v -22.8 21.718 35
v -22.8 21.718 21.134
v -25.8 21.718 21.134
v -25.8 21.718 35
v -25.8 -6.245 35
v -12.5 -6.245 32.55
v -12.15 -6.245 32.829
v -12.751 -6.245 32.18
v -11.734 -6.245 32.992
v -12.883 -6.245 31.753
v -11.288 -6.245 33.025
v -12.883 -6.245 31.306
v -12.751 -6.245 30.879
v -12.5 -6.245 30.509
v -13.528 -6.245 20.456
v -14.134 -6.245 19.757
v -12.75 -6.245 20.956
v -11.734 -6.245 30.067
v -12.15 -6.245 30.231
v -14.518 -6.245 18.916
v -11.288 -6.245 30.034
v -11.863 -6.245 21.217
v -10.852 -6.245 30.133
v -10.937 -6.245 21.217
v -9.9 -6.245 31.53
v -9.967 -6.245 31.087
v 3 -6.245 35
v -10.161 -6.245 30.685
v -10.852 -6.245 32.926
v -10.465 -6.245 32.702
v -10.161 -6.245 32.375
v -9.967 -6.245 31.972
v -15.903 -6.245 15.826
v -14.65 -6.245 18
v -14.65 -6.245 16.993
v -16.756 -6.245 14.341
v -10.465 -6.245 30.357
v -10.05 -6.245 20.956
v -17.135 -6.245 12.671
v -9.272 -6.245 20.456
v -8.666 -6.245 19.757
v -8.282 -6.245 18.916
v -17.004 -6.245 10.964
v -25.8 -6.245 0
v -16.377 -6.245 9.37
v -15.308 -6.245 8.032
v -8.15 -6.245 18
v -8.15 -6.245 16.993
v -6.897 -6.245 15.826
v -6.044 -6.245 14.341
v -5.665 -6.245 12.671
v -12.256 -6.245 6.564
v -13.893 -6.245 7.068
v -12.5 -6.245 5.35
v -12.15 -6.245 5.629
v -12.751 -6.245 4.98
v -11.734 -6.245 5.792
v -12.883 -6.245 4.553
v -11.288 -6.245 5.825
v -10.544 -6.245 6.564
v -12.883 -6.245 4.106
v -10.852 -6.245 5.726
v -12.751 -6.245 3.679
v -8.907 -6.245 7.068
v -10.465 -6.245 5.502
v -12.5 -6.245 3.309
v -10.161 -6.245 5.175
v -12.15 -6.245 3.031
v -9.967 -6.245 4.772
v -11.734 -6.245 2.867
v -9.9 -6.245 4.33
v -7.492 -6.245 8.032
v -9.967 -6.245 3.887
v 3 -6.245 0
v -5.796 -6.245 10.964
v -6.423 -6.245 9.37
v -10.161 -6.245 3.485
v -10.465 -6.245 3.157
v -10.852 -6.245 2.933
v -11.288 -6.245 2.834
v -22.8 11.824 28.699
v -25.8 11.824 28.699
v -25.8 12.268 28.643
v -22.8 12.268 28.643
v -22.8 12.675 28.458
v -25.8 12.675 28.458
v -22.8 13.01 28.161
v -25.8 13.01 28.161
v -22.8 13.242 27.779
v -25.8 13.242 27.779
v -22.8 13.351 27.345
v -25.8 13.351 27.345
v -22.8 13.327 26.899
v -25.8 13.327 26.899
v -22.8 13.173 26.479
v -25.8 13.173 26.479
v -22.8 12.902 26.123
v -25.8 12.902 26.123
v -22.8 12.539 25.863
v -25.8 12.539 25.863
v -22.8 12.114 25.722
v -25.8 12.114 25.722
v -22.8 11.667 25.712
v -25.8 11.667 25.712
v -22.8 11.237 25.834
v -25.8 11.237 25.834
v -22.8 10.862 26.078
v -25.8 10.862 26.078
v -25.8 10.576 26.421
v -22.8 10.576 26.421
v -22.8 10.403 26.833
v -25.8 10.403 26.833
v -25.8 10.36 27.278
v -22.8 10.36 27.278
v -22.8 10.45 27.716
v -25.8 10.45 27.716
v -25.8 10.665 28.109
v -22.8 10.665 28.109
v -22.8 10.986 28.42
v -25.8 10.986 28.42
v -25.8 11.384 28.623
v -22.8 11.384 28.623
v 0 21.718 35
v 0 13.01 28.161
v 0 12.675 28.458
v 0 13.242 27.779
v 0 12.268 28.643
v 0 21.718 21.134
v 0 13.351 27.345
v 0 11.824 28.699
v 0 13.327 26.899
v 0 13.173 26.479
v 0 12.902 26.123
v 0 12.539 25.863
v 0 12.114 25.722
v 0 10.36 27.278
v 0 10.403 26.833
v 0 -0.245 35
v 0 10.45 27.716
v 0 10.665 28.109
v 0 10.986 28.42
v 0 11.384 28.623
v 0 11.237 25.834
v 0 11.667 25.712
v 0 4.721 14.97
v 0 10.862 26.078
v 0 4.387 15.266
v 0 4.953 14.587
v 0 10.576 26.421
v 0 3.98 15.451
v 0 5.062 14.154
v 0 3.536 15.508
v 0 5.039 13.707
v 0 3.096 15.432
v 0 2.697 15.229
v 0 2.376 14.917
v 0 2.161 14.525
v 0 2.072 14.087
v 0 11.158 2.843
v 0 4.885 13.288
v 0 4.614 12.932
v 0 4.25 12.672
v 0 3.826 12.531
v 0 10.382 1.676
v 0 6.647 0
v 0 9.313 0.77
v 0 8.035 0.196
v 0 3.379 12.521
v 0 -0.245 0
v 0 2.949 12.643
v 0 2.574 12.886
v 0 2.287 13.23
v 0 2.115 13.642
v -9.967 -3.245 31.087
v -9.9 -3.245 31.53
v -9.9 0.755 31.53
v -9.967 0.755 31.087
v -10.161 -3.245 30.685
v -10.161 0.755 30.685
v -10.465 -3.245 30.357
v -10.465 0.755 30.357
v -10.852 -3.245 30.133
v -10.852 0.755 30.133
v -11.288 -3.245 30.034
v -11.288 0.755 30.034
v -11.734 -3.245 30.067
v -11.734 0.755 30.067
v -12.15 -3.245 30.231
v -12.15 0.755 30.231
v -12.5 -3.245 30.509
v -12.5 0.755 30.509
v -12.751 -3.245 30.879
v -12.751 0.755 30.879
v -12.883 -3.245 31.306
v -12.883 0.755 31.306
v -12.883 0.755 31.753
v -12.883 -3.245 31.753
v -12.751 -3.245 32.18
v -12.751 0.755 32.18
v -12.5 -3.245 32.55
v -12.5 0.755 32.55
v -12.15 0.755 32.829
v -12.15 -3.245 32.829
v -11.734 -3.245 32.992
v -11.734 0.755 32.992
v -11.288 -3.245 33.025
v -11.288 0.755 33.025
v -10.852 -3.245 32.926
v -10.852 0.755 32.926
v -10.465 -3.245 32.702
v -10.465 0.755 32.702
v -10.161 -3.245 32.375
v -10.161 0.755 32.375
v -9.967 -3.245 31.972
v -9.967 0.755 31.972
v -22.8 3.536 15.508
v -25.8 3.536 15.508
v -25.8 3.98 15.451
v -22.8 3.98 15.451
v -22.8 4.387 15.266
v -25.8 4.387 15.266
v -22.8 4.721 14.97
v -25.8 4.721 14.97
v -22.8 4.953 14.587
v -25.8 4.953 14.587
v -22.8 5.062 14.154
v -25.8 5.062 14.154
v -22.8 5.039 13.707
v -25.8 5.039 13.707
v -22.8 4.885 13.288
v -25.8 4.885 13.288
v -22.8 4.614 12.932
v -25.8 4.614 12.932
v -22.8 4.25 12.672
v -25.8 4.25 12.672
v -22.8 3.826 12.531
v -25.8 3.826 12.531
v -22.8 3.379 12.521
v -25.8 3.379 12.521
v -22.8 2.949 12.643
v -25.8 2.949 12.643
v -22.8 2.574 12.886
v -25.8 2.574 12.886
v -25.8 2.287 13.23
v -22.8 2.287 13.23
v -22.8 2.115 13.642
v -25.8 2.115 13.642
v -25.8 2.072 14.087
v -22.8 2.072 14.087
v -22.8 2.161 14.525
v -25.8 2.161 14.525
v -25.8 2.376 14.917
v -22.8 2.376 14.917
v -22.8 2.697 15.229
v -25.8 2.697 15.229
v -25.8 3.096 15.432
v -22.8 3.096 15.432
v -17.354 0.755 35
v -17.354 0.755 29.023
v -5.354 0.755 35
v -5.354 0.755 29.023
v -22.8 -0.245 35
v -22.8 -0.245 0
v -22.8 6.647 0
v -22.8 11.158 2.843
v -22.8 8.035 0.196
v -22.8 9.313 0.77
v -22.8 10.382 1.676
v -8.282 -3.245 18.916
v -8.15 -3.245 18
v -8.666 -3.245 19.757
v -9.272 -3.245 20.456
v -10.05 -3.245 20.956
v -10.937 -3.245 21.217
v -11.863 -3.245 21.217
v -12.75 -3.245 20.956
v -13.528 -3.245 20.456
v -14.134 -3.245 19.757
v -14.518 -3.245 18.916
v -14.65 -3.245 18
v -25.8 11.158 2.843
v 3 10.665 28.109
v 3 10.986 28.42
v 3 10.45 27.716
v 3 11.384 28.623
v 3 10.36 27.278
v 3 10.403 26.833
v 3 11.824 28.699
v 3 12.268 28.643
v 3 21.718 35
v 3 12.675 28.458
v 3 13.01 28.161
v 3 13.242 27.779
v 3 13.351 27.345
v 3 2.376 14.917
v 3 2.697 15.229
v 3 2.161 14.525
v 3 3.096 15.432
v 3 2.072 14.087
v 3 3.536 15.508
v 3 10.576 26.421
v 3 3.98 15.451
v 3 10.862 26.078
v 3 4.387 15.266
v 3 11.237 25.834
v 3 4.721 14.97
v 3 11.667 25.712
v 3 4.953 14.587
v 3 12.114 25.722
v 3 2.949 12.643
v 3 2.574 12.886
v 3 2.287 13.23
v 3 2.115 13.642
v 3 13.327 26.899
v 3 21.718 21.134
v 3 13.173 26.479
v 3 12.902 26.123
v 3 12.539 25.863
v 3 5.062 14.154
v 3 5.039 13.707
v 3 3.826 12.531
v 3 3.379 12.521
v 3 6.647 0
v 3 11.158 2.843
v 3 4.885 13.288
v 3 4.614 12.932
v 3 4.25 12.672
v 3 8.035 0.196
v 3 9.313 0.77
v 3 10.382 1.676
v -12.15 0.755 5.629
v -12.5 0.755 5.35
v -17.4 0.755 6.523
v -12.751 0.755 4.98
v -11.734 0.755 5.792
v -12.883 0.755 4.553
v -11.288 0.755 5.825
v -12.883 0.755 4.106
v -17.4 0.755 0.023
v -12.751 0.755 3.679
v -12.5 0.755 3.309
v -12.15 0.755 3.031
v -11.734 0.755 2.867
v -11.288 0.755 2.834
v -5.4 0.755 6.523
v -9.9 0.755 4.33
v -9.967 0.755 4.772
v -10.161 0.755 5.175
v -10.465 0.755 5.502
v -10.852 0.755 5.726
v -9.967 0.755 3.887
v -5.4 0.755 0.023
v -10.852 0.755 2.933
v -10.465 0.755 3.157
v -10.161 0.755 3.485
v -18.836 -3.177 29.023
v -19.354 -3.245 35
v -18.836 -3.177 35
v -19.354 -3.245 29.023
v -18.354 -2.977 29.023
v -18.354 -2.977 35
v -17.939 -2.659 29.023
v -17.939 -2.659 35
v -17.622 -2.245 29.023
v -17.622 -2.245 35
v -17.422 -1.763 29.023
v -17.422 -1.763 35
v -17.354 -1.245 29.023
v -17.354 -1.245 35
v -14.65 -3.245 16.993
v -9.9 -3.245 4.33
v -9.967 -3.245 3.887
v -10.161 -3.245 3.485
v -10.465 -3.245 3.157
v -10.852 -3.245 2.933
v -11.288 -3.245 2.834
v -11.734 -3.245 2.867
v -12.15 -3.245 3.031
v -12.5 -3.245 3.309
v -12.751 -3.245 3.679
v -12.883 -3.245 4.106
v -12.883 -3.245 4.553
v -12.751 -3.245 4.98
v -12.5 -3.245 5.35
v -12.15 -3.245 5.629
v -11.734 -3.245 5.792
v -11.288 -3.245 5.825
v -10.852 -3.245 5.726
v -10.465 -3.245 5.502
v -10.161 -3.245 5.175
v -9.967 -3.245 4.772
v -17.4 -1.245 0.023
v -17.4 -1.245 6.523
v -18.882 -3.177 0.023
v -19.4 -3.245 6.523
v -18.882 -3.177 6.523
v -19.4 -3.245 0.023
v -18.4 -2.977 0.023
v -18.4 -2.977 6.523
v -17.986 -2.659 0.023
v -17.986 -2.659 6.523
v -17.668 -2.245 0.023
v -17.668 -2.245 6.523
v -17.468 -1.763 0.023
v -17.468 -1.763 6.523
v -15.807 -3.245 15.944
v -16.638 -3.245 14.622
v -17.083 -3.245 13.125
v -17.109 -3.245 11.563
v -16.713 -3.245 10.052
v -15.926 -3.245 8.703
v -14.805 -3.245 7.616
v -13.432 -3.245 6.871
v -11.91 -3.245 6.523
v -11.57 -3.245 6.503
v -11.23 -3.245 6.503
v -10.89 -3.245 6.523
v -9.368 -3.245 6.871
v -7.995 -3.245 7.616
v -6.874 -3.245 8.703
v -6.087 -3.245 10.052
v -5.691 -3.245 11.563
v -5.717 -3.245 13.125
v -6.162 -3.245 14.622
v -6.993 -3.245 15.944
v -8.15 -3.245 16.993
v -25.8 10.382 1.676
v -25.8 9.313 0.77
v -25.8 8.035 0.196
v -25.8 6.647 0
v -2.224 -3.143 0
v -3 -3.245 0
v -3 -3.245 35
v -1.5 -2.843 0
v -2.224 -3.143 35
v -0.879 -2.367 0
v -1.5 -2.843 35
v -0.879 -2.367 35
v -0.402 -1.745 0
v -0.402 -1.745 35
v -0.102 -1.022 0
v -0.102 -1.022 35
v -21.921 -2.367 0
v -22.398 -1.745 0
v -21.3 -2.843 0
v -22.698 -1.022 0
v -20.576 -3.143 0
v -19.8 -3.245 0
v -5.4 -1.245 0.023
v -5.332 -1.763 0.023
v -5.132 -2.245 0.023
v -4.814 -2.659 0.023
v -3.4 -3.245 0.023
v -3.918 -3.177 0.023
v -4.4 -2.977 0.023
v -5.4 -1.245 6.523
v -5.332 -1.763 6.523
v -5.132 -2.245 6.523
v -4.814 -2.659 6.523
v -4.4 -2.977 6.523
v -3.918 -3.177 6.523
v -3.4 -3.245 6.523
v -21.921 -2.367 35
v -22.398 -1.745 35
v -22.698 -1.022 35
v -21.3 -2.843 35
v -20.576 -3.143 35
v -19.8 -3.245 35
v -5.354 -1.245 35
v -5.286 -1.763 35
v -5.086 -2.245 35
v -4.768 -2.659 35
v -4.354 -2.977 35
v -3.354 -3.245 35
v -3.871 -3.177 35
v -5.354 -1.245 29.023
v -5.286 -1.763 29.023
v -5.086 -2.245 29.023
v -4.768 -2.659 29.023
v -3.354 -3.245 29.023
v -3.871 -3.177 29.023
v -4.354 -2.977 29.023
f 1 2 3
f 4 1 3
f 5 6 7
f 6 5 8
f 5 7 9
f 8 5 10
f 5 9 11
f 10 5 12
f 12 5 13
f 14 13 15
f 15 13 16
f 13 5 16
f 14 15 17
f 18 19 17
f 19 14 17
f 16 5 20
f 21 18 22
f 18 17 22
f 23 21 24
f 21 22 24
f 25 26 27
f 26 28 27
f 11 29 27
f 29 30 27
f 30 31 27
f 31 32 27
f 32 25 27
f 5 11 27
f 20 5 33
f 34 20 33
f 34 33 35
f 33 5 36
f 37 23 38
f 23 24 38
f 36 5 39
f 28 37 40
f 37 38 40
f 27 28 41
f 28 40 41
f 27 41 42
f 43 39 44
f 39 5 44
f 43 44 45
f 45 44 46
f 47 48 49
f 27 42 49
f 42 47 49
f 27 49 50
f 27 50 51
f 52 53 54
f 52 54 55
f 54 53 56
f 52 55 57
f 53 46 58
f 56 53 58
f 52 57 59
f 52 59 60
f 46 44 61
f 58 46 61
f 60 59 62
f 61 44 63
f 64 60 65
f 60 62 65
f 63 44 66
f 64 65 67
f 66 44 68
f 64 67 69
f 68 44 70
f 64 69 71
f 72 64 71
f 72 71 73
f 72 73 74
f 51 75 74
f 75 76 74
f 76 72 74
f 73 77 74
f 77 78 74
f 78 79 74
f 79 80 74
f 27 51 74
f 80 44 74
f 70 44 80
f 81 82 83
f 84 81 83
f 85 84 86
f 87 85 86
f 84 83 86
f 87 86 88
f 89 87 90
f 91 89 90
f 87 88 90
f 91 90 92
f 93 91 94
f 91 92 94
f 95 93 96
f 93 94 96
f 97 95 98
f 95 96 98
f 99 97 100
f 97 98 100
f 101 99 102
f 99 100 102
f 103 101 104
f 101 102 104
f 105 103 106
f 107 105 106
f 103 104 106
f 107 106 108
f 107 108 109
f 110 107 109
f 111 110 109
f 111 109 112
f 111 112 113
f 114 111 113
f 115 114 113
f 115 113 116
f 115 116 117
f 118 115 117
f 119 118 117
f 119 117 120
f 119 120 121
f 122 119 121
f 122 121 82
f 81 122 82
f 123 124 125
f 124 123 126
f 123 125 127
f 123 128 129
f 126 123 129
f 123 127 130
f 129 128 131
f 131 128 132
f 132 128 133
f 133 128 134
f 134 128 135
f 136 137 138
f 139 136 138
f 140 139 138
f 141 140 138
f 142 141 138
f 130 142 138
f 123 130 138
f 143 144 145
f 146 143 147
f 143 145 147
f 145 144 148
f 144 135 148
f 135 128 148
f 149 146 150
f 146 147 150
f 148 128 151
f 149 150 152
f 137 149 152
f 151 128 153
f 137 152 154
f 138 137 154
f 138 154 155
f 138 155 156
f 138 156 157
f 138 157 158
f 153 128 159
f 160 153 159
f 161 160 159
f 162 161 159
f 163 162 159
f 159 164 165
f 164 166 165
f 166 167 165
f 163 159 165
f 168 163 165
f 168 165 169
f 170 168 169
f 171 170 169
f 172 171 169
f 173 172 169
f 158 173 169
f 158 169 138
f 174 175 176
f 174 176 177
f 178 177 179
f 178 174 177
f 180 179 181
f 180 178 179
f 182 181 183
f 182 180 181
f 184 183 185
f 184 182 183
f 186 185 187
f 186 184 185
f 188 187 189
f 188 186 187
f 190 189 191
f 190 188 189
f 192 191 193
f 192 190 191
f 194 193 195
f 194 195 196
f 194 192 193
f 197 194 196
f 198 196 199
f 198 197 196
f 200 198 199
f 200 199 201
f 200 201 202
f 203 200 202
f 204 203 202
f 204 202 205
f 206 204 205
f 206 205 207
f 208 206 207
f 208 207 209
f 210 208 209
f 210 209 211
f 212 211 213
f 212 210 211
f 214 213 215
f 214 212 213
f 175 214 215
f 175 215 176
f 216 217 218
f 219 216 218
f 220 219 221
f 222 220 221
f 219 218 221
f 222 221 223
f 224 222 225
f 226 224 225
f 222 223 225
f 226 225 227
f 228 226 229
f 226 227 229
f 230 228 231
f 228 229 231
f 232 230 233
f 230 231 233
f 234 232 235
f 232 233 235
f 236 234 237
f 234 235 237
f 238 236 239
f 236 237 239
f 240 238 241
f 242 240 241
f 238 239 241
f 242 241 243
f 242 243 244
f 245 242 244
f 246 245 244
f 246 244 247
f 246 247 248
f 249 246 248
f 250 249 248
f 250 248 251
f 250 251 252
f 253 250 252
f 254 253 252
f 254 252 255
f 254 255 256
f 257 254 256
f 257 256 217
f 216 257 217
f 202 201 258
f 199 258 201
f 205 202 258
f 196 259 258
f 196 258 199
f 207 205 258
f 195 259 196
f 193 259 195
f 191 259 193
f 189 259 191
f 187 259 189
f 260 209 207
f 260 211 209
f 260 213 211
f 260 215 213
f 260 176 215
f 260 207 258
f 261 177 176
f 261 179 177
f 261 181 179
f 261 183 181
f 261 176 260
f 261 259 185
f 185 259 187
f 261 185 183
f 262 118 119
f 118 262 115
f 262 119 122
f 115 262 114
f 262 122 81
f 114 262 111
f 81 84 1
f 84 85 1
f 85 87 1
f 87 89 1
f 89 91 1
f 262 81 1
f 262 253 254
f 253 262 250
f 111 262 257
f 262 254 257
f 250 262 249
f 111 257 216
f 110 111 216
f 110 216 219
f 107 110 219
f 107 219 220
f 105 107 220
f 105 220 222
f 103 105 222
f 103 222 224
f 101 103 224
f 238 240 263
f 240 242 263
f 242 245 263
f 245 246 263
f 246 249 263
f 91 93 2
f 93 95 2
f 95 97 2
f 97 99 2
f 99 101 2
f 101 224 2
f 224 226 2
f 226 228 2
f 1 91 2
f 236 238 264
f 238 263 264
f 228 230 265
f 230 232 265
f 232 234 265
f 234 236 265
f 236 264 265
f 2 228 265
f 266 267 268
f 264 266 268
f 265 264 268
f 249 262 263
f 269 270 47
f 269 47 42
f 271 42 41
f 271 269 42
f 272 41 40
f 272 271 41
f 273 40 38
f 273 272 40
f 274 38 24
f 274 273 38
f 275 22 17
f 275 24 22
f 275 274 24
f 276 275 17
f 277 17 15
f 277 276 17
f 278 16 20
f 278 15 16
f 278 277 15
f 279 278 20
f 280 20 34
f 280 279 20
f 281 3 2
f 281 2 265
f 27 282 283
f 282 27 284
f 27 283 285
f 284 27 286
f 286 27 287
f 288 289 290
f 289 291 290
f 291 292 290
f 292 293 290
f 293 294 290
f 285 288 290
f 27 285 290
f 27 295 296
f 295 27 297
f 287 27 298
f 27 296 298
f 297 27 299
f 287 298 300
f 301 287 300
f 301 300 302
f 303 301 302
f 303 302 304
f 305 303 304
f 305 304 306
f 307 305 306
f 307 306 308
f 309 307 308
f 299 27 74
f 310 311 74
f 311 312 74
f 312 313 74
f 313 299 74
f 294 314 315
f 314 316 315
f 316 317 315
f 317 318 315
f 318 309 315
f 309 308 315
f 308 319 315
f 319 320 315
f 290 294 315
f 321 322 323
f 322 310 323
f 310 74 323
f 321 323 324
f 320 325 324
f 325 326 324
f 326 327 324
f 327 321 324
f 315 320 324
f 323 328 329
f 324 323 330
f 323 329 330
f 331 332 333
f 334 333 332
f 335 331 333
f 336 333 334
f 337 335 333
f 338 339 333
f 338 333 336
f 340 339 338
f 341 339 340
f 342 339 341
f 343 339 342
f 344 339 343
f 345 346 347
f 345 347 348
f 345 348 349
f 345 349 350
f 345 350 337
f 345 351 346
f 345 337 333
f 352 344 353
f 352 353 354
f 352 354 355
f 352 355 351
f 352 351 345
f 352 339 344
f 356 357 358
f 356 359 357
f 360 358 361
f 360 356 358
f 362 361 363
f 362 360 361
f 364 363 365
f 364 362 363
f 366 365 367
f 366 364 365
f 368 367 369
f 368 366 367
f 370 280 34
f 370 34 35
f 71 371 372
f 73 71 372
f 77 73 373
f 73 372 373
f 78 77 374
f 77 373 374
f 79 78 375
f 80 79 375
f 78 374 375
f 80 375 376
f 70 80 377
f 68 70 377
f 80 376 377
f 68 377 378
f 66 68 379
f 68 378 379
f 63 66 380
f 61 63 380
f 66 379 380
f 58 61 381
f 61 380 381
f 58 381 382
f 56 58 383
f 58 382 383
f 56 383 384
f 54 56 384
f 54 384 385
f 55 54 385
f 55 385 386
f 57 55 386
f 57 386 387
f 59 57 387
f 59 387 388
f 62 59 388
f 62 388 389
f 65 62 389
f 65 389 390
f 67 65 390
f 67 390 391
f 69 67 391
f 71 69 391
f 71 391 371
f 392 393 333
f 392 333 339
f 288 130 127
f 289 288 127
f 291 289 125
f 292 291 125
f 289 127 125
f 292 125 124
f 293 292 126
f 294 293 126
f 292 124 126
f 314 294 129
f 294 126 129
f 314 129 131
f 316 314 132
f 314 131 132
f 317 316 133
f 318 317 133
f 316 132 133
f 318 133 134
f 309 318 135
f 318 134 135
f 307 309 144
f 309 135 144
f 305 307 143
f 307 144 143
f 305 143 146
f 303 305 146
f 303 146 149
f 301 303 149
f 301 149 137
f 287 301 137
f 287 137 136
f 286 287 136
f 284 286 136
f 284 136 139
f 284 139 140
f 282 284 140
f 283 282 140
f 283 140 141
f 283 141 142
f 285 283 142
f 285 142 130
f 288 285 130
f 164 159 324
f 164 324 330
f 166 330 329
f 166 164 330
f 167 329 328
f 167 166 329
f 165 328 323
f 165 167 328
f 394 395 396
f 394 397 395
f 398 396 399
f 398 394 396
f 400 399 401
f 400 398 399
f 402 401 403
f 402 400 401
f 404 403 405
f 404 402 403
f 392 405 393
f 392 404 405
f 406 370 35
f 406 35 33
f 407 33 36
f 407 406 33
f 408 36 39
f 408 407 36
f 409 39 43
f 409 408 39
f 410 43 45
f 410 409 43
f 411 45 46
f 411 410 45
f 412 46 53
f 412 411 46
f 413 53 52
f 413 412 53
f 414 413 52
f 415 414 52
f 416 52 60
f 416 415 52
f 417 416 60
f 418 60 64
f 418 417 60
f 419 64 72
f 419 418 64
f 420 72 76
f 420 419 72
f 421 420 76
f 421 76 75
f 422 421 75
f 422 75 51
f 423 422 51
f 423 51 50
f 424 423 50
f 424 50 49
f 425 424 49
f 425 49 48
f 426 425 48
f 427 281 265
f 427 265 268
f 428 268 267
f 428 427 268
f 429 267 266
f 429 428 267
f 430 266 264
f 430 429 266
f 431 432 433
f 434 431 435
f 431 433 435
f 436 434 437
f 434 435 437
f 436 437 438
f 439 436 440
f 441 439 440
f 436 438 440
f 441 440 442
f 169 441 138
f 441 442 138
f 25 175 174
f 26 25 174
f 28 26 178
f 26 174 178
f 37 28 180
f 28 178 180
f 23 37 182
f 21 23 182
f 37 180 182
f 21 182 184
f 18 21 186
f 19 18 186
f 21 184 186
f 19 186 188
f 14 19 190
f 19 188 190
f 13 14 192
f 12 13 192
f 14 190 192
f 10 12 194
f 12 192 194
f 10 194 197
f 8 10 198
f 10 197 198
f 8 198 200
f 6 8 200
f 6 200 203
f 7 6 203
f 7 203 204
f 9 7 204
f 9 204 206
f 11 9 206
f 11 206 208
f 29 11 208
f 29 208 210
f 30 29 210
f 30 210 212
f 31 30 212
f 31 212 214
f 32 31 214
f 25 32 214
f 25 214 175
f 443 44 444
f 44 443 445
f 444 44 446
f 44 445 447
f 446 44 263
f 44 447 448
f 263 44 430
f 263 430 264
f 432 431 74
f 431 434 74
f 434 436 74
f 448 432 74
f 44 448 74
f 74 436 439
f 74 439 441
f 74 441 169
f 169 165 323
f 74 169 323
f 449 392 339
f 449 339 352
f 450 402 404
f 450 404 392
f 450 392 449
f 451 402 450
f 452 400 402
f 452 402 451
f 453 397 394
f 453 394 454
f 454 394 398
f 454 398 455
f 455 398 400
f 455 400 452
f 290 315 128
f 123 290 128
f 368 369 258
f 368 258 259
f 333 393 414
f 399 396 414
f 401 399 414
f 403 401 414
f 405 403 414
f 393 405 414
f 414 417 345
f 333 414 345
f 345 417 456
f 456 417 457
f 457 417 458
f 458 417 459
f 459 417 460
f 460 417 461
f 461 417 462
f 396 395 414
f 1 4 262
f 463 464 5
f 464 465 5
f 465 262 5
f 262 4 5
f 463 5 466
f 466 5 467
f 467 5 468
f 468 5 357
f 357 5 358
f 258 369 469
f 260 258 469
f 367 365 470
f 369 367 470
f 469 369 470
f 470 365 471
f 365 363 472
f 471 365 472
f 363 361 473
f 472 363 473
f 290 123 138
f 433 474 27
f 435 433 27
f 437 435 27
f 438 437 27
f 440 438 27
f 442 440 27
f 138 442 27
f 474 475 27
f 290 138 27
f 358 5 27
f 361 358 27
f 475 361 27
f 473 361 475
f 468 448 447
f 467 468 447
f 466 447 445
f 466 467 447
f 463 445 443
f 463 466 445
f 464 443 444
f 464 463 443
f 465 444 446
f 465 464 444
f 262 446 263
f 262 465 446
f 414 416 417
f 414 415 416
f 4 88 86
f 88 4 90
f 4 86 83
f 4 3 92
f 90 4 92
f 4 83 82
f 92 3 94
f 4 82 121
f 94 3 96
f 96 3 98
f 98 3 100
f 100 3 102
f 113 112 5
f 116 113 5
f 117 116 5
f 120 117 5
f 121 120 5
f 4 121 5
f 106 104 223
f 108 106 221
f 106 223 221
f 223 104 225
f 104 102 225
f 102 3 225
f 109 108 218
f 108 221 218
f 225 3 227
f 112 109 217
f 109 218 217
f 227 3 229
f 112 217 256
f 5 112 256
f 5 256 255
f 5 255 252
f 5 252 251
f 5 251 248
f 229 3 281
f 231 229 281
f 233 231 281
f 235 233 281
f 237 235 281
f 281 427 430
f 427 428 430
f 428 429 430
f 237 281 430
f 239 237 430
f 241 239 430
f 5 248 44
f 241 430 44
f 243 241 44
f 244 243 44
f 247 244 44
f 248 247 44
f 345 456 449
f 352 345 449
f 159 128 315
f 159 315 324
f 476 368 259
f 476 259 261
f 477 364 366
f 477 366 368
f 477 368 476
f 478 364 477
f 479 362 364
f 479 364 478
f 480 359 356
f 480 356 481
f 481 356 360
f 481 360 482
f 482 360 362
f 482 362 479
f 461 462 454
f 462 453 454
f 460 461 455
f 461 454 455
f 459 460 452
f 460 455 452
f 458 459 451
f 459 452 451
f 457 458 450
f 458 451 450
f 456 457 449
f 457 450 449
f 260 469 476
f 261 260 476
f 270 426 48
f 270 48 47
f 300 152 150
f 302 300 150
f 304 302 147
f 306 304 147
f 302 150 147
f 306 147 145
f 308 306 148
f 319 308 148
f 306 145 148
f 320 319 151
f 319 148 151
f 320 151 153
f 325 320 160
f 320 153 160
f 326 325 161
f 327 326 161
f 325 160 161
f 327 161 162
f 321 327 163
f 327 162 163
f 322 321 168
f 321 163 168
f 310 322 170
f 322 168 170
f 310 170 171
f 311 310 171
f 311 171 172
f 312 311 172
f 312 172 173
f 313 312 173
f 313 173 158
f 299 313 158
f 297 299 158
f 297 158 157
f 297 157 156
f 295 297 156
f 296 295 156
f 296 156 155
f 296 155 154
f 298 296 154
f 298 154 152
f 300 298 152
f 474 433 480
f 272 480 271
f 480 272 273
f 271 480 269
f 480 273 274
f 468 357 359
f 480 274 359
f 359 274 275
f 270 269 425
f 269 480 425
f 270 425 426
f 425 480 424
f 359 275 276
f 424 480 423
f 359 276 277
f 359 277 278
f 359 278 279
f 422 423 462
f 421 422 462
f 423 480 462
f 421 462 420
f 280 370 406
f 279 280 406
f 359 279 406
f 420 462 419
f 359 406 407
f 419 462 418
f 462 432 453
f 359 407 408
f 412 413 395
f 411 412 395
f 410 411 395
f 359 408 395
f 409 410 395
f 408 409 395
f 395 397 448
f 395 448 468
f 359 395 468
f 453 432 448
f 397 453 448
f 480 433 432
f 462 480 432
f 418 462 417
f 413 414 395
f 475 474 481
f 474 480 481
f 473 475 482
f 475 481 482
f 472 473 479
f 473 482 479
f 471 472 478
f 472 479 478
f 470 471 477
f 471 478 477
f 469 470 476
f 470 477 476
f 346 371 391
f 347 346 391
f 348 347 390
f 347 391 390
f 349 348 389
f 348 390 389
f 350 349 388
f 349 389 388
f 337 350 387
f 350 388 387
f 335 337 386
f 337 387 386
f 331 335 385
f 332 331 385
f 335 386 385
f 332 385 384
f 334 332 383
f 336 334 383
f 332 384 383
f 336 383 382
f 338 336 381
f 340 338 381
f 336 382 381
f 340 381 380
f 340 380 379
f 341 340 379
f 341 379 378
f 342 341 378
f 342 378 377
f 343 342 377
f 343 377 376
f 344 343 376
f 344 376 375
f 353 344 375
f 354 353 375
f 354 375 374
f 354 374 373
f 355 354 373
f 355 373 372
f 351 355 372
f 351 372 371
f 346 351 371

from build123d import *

# Parameters (mm, degrees)
EXTRUDE_1_DEPTH     = 35
SKETCH_7_W          = 12
SKETCH_7_H          = 6.5
EXTRUDE_3_DEPTH     = 4
CUT_EXTRUDE_1_REACH = 5
SKETCH_2_R          = 1.5
CUT_EXTRUDE_2_DEPTH = 28.8
SKETCH_6_W          = 12
SKETCH_6_H          = 5.977376498
SKETCH_6_R          = 1.5
EXTRUDE_2_DEPTH     = 4
CUT_EXTRUDE_3_REACH = 29.964
SKETCH_9_R          = 1.5
FILLET_1_R          = 3
FILLET_2_R          = 2
MM_CLEARANCE_1_D    = 3


with BuildPart() as part:
    # 草图1 → 凸台-拉伸1 (new body)
    with BuildSketch(Plane.XY):
        Polygon((-25.8, 21.661752689), (-25.8, -6.245255474), (3, -6.245255474), (3, 21.718248175), (0, 21.718248175), (0, -3.245255474), (-22.8, -3.245255474), (-22.8, 21.718248175), (-25.8, 21.718248175), align=None)
    extrude(amount=EXTRUDE_1_DEPTH)

    # 草图7 → 凸台-拉伸3 (add)
    with BuildSketch(Plane(origin=(0, -3.245255474, 0), x_dir=(1, 0, 0), z_dir=(0, 1, 0))):
        with Locations((-11.4, -3.272623502)):
            Rectangle(SKETCH_7_W, SKETCH_7_H)
    extrude(amount=EXTRUDE_3_DEPTH)

    # 草图2 → 切除-拉伸1 (cut, up to next)
    with BuildSketch(Plane(origin=(0, -3.245255474, 0), x_dir=(1, 0, 0), z_dir=(0, 1, 0)), mode=Mode.PRIVATE) as cut_extrude_1_sk1:
        with Locations((-11.4, -4.329564509)):
            Circle(SKETCH_2_R)
    cut_extrude_1_tool1 = extrude(cut_extrude_1_sk1.sketch, amount=-CUT_EXTRUDE_1_REACH, mode=Mode.PRIVATE) & part.part
    add(cut_extrude_1_tool1.solids().sort_by_distance((-11.4, -3.245255, 4.329565))[0], mode=Mode.SUBTRACT)
    # 草图2 → 切除-拉伸1 (cut, up to next)
    with BuildSketch(Plane(origin=(0, -3.245255474, 0), x_dir=(1, 0, 0), z_dir=(0, 1, 0)), mode=Mode.PRIVATE) as cut_extrude_1_sk2:
        with Locations((-11.4, -31.529564509)):
            Circle(SKETCH_2_R)
    cut_extrude_1_tool2 = extrude(cut_extrude_1_sk2.sketch, amount=-CUT_EXTRUDE_1_REACH, mode=Mode.PRIVATE) & part.part
    add(cut_extrude_1_tool2.solids().sort_by_distance((-11.4, -3.245255, 31.529565))[0], mode=Mode.SUBTRACT)
    # 草图2 → 切除-拉伸1 (cut, up to next)
    with BuildSketch(Plane(origin=(0, -3.245255474, 0), x_dir=(1, 0, 0), z_dir=(0, 1, 0)), mode=Mode.PRIVATE) as cut_extrude_1_sk3:
        with BuildLine():
            Line((-14.65, -18), (-14.65, -16.99341649))
            ThreePointArc((-14.65, -16.99341649), (-11.4, -6.5), (-8.15, -16.99341649))
            Line((-8.15, -16.99341649), (-8.15, -18))
            ThreePointArc((-8.15, -18), (-11.4, -21.25), (-14.65, -18))
        make_face()
    cut_extrude_1_tool3 = extrude(cut_extrude_1_sk3.sketch, amount=-CUT_EXTRUDE_1_REACH, mode=Mode.PRIVATE) & part.part
    add(cut_extrude_1_tool3.solids().sort_by_distance((-11.4, -3.245255, 13.308508))[0], mode=Mode.SUBTRACT)

    # 草图5 → 切除-拉伸2 (cut)
    with BuildSketch(Plane.ZY.offset(25.8)):
        with BuildLine():
            Line((0, 6.647160947), (0, 21.718248175))
            Line((0, 21.718248175), (21.134010141, 21.718248175))
            Line((21.134010141, 21.718248175), (2.843364957, 11.158139254))
            ThreePointArc((2.843364957, 11.158139254), (0.770155132, 9.313321556), (0, 6.647160947))
        make_face()
    extrude(amount=-CUT_EXTRUDE_2_DEPTH, mode=Mode.SUBTRACT)

    # 草图6 → 凸台-拉伸2 (add)
    with BuildSketch(Plane(origin=(0, -3.245255474, 0), x_dir=(1, 0, 0), z_dir=(0, 1, 0))):
        with Locations((-11.353661672, -32.011311751)):
            Rectangle(SKETCH_6_W, SKETCH_6_H)
        with Locations((-11.4, -31.529564509)):
            Circle(SKETCH_6_R, mode=Mode.SUBTRACT)
    extrude(amount=EXTRUDE_2_DEPTH)

    # 草图9 → 切除-拉伸3 (cut, up to next)
    with BuildSketch(Plane.XZ.offset(6.245255474), mode=Mode.PRIVATE) as cut_extrude_3_sk1:
        with Locations((-11.4, 4.329564509)):
            Circle(SKETCH_9_R)
    cut_extrude_3_tool1 = extrude(cut_extrude_3_sk1.sketch, amount=-CUT_EXTRUDE_3_REACH, mode=Mode.PRIVATE) & part.part
    add(cut_extrude_3_tool1.solids().sort_by_distance((-11.4, -6.245255, 4.329565))[0], mode=Mode.SUBTRACT)

    # 圆角1
    fillet_1_edges = [part.edges().sort_by_distance(p)[0] for p in [
        (-22.8, -3.245255474, 17.5),
        (0, -3.245255474, 17.5),
    ]]
    fillet(fillet_1_edges, radius=FILLET_1_R)

    # 圆角2
    fillet_2_edges = [part.edges().sort_by_distance(p)[0] for p in [
        (-5.4, -3.245255474, 3.272623502),
        (-17.4, -3.245255474, 3.272623502),
        (-5.353661672, -3.245255474, 32.011311751),
        (-17.353661672, -3.245255474, 32.011311751),
    ]]
    fillet(fillet_2_edges, radius=FILLET_2_R)

    # 大小mm Clearance 暗销孔1 (through all)
    with Locations(Plane(origin=(3, -125.31519419, 113.107396439), x_dir=(0, 0.022253058, -0.99975237), z_dir=(1, 0, 0))):
        with Locations((88.938953066, 135.227377046), (101.942467158, 126.647536361), (127.53759353, 125.598807912), (135.454300746, 124.4473971)):
            Hole(MM_CLEARANCE_1_D / 2)


solid = part.part
